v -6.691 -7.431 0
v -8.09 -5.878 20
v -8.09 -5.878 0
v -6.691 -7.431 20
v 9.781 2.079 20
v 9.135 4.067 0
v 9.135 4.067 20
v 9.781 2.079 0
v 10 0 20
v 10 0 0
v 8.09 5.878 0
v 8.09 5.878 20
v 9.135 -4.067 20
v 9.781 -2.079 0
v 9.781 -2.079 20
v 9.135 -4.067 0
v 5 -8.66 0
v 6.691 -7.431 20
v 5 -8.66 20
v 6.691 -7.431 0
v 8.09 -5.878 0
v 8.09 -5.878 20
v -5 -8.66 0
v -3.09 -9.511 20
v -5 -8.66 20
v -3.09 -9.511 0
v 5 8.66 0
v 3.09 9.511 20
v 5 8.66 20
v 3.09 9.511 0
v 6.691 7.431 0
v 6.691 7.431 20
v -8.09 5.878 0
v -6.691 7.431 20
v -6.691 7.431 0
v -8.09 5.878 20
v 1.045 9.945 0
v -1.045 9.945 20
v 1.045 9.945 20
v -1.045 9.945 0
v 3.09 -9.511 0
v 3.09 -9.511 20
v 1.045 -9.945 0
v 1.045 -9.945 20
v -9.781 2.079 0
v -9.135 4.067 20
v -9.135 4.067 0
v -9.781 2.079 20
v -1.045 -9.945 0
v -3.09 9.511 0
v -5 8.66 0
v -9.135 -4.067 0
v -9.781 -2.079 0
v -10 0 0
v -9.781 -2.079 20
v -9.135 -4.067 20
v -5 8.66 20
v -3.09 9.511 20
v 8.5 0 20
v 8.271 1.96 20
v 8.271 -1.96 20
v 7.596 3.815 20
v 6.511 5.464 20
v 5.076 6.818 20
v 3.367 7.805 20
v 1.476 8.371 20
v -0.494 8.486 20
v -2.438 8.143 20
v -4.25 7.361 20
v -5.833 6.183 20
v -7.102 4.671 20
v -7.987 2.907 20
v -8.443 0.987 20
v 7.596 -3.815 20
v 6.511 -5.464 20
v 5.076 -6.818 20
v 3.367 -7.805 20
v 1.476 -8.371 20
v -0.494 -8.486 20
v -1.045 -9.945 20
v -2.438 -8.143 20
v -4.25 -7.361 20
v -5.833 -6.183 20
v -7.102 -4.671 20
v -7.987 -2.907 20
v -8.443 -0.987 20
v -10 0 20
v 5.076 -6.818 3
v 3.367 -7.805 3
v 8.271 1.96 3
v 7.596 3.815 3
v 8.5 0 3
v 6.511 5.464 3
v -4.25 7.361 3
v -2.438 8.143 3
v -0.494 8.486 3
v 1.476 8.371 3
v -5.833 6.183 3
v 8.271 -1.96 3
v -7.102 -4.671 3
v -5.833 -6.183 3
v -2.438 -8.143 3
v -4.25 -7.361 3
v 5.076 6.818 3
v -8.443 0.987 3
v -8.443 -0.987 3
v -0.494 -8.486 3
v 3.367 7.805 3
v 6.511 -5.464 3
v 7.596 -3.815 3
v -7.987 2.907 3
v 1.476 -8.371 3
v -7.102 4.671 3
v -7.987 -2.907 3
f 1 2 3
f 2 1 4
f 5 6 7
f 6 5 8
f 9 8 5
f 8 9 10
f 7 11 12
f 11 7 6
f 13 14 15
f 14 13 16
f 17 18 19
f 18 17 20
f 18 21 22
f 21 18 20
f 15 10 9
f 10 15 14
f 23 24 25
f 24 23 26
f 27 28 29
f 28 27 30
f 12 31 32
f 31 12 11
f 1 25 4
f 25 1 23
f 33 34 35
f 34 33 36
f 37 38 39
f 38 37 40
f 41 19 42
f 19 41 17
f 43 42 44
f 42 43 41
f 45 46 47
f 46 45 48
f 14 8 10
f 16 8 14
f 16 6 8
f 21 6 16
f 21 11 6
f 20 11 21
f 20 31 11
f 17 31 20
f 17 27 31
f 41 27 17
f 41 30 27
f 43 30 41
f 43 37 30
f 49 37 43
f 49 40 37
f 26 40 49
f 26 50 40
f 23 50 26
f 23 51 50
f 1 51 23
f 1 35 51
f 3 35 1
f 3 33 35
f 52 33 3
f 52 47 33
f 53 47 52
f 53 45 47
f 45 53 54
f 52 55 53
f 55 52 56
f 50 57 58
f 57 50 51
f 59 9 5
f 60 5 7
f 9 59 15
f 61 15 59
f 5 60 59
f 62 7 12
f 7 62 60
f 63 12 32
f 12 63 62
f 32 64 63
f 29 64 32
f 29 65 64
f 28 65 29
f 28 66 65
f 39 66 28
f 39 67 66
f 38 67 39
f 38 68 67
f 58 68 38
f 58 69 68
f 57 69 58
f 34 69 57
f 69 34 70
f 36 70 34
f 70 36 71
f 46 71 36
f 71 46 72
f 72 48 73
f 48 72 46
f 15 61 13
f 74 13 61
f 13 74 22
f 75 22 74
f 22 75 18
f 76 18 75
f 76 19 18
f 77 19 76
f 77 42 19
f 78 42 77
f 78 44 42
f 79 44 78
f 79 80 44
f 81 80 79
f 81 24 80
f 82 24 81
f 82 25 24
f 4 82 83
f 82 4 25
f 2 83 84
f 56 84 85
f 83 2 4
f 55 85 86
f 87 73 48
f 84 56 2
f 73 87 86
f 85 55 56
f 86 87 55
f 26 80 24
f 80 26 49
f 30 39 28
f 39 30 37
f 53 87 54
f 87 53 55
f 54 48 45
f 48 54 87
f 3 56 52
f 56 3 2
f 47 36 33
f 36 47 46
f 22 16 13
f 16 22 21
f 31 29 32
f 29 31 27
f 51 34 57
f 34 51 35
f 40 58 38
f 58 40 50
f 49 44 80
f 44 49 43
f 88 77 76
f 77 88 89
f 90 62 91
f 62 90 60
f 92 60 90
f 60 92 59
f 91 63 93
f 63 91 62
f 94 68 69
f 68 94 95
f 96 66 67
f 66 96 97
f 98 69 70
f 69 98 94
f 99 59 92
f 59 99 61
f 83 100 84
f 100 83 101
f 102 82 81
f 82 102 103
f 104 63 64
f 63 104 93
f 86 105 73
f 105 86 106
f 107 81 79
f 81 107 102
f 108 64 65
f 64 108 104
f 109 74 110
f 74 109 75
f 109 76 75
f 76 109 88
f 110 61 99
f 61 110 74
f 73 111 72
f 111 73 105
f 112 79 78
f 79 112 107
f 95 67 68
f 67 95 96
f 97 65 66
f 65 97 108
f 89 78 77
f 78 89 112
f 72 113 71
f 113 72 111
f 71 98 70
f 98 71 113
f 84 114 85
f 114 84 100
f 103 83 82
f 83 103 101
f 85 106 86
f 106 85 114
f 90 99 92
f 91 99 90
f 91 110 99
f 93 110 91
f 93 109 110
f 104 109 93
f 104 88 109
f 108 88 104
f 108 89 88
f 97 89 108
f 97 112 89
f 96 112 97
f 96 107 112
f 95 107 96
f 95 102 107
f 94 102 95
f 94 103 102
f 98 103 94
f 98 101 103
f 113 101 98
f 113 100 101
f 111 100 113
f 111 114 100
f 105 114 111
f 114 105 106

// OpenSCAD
module bottom(size=15, thickness=3) {
    f  = (size-thickness)/size;
    difference() {
        cylinder(size, d=size);
        translate([0, 0, thickness]) cylinder(size, d=(size-thickness));
        
    }
}

bottom(size=20, thickness=3);
